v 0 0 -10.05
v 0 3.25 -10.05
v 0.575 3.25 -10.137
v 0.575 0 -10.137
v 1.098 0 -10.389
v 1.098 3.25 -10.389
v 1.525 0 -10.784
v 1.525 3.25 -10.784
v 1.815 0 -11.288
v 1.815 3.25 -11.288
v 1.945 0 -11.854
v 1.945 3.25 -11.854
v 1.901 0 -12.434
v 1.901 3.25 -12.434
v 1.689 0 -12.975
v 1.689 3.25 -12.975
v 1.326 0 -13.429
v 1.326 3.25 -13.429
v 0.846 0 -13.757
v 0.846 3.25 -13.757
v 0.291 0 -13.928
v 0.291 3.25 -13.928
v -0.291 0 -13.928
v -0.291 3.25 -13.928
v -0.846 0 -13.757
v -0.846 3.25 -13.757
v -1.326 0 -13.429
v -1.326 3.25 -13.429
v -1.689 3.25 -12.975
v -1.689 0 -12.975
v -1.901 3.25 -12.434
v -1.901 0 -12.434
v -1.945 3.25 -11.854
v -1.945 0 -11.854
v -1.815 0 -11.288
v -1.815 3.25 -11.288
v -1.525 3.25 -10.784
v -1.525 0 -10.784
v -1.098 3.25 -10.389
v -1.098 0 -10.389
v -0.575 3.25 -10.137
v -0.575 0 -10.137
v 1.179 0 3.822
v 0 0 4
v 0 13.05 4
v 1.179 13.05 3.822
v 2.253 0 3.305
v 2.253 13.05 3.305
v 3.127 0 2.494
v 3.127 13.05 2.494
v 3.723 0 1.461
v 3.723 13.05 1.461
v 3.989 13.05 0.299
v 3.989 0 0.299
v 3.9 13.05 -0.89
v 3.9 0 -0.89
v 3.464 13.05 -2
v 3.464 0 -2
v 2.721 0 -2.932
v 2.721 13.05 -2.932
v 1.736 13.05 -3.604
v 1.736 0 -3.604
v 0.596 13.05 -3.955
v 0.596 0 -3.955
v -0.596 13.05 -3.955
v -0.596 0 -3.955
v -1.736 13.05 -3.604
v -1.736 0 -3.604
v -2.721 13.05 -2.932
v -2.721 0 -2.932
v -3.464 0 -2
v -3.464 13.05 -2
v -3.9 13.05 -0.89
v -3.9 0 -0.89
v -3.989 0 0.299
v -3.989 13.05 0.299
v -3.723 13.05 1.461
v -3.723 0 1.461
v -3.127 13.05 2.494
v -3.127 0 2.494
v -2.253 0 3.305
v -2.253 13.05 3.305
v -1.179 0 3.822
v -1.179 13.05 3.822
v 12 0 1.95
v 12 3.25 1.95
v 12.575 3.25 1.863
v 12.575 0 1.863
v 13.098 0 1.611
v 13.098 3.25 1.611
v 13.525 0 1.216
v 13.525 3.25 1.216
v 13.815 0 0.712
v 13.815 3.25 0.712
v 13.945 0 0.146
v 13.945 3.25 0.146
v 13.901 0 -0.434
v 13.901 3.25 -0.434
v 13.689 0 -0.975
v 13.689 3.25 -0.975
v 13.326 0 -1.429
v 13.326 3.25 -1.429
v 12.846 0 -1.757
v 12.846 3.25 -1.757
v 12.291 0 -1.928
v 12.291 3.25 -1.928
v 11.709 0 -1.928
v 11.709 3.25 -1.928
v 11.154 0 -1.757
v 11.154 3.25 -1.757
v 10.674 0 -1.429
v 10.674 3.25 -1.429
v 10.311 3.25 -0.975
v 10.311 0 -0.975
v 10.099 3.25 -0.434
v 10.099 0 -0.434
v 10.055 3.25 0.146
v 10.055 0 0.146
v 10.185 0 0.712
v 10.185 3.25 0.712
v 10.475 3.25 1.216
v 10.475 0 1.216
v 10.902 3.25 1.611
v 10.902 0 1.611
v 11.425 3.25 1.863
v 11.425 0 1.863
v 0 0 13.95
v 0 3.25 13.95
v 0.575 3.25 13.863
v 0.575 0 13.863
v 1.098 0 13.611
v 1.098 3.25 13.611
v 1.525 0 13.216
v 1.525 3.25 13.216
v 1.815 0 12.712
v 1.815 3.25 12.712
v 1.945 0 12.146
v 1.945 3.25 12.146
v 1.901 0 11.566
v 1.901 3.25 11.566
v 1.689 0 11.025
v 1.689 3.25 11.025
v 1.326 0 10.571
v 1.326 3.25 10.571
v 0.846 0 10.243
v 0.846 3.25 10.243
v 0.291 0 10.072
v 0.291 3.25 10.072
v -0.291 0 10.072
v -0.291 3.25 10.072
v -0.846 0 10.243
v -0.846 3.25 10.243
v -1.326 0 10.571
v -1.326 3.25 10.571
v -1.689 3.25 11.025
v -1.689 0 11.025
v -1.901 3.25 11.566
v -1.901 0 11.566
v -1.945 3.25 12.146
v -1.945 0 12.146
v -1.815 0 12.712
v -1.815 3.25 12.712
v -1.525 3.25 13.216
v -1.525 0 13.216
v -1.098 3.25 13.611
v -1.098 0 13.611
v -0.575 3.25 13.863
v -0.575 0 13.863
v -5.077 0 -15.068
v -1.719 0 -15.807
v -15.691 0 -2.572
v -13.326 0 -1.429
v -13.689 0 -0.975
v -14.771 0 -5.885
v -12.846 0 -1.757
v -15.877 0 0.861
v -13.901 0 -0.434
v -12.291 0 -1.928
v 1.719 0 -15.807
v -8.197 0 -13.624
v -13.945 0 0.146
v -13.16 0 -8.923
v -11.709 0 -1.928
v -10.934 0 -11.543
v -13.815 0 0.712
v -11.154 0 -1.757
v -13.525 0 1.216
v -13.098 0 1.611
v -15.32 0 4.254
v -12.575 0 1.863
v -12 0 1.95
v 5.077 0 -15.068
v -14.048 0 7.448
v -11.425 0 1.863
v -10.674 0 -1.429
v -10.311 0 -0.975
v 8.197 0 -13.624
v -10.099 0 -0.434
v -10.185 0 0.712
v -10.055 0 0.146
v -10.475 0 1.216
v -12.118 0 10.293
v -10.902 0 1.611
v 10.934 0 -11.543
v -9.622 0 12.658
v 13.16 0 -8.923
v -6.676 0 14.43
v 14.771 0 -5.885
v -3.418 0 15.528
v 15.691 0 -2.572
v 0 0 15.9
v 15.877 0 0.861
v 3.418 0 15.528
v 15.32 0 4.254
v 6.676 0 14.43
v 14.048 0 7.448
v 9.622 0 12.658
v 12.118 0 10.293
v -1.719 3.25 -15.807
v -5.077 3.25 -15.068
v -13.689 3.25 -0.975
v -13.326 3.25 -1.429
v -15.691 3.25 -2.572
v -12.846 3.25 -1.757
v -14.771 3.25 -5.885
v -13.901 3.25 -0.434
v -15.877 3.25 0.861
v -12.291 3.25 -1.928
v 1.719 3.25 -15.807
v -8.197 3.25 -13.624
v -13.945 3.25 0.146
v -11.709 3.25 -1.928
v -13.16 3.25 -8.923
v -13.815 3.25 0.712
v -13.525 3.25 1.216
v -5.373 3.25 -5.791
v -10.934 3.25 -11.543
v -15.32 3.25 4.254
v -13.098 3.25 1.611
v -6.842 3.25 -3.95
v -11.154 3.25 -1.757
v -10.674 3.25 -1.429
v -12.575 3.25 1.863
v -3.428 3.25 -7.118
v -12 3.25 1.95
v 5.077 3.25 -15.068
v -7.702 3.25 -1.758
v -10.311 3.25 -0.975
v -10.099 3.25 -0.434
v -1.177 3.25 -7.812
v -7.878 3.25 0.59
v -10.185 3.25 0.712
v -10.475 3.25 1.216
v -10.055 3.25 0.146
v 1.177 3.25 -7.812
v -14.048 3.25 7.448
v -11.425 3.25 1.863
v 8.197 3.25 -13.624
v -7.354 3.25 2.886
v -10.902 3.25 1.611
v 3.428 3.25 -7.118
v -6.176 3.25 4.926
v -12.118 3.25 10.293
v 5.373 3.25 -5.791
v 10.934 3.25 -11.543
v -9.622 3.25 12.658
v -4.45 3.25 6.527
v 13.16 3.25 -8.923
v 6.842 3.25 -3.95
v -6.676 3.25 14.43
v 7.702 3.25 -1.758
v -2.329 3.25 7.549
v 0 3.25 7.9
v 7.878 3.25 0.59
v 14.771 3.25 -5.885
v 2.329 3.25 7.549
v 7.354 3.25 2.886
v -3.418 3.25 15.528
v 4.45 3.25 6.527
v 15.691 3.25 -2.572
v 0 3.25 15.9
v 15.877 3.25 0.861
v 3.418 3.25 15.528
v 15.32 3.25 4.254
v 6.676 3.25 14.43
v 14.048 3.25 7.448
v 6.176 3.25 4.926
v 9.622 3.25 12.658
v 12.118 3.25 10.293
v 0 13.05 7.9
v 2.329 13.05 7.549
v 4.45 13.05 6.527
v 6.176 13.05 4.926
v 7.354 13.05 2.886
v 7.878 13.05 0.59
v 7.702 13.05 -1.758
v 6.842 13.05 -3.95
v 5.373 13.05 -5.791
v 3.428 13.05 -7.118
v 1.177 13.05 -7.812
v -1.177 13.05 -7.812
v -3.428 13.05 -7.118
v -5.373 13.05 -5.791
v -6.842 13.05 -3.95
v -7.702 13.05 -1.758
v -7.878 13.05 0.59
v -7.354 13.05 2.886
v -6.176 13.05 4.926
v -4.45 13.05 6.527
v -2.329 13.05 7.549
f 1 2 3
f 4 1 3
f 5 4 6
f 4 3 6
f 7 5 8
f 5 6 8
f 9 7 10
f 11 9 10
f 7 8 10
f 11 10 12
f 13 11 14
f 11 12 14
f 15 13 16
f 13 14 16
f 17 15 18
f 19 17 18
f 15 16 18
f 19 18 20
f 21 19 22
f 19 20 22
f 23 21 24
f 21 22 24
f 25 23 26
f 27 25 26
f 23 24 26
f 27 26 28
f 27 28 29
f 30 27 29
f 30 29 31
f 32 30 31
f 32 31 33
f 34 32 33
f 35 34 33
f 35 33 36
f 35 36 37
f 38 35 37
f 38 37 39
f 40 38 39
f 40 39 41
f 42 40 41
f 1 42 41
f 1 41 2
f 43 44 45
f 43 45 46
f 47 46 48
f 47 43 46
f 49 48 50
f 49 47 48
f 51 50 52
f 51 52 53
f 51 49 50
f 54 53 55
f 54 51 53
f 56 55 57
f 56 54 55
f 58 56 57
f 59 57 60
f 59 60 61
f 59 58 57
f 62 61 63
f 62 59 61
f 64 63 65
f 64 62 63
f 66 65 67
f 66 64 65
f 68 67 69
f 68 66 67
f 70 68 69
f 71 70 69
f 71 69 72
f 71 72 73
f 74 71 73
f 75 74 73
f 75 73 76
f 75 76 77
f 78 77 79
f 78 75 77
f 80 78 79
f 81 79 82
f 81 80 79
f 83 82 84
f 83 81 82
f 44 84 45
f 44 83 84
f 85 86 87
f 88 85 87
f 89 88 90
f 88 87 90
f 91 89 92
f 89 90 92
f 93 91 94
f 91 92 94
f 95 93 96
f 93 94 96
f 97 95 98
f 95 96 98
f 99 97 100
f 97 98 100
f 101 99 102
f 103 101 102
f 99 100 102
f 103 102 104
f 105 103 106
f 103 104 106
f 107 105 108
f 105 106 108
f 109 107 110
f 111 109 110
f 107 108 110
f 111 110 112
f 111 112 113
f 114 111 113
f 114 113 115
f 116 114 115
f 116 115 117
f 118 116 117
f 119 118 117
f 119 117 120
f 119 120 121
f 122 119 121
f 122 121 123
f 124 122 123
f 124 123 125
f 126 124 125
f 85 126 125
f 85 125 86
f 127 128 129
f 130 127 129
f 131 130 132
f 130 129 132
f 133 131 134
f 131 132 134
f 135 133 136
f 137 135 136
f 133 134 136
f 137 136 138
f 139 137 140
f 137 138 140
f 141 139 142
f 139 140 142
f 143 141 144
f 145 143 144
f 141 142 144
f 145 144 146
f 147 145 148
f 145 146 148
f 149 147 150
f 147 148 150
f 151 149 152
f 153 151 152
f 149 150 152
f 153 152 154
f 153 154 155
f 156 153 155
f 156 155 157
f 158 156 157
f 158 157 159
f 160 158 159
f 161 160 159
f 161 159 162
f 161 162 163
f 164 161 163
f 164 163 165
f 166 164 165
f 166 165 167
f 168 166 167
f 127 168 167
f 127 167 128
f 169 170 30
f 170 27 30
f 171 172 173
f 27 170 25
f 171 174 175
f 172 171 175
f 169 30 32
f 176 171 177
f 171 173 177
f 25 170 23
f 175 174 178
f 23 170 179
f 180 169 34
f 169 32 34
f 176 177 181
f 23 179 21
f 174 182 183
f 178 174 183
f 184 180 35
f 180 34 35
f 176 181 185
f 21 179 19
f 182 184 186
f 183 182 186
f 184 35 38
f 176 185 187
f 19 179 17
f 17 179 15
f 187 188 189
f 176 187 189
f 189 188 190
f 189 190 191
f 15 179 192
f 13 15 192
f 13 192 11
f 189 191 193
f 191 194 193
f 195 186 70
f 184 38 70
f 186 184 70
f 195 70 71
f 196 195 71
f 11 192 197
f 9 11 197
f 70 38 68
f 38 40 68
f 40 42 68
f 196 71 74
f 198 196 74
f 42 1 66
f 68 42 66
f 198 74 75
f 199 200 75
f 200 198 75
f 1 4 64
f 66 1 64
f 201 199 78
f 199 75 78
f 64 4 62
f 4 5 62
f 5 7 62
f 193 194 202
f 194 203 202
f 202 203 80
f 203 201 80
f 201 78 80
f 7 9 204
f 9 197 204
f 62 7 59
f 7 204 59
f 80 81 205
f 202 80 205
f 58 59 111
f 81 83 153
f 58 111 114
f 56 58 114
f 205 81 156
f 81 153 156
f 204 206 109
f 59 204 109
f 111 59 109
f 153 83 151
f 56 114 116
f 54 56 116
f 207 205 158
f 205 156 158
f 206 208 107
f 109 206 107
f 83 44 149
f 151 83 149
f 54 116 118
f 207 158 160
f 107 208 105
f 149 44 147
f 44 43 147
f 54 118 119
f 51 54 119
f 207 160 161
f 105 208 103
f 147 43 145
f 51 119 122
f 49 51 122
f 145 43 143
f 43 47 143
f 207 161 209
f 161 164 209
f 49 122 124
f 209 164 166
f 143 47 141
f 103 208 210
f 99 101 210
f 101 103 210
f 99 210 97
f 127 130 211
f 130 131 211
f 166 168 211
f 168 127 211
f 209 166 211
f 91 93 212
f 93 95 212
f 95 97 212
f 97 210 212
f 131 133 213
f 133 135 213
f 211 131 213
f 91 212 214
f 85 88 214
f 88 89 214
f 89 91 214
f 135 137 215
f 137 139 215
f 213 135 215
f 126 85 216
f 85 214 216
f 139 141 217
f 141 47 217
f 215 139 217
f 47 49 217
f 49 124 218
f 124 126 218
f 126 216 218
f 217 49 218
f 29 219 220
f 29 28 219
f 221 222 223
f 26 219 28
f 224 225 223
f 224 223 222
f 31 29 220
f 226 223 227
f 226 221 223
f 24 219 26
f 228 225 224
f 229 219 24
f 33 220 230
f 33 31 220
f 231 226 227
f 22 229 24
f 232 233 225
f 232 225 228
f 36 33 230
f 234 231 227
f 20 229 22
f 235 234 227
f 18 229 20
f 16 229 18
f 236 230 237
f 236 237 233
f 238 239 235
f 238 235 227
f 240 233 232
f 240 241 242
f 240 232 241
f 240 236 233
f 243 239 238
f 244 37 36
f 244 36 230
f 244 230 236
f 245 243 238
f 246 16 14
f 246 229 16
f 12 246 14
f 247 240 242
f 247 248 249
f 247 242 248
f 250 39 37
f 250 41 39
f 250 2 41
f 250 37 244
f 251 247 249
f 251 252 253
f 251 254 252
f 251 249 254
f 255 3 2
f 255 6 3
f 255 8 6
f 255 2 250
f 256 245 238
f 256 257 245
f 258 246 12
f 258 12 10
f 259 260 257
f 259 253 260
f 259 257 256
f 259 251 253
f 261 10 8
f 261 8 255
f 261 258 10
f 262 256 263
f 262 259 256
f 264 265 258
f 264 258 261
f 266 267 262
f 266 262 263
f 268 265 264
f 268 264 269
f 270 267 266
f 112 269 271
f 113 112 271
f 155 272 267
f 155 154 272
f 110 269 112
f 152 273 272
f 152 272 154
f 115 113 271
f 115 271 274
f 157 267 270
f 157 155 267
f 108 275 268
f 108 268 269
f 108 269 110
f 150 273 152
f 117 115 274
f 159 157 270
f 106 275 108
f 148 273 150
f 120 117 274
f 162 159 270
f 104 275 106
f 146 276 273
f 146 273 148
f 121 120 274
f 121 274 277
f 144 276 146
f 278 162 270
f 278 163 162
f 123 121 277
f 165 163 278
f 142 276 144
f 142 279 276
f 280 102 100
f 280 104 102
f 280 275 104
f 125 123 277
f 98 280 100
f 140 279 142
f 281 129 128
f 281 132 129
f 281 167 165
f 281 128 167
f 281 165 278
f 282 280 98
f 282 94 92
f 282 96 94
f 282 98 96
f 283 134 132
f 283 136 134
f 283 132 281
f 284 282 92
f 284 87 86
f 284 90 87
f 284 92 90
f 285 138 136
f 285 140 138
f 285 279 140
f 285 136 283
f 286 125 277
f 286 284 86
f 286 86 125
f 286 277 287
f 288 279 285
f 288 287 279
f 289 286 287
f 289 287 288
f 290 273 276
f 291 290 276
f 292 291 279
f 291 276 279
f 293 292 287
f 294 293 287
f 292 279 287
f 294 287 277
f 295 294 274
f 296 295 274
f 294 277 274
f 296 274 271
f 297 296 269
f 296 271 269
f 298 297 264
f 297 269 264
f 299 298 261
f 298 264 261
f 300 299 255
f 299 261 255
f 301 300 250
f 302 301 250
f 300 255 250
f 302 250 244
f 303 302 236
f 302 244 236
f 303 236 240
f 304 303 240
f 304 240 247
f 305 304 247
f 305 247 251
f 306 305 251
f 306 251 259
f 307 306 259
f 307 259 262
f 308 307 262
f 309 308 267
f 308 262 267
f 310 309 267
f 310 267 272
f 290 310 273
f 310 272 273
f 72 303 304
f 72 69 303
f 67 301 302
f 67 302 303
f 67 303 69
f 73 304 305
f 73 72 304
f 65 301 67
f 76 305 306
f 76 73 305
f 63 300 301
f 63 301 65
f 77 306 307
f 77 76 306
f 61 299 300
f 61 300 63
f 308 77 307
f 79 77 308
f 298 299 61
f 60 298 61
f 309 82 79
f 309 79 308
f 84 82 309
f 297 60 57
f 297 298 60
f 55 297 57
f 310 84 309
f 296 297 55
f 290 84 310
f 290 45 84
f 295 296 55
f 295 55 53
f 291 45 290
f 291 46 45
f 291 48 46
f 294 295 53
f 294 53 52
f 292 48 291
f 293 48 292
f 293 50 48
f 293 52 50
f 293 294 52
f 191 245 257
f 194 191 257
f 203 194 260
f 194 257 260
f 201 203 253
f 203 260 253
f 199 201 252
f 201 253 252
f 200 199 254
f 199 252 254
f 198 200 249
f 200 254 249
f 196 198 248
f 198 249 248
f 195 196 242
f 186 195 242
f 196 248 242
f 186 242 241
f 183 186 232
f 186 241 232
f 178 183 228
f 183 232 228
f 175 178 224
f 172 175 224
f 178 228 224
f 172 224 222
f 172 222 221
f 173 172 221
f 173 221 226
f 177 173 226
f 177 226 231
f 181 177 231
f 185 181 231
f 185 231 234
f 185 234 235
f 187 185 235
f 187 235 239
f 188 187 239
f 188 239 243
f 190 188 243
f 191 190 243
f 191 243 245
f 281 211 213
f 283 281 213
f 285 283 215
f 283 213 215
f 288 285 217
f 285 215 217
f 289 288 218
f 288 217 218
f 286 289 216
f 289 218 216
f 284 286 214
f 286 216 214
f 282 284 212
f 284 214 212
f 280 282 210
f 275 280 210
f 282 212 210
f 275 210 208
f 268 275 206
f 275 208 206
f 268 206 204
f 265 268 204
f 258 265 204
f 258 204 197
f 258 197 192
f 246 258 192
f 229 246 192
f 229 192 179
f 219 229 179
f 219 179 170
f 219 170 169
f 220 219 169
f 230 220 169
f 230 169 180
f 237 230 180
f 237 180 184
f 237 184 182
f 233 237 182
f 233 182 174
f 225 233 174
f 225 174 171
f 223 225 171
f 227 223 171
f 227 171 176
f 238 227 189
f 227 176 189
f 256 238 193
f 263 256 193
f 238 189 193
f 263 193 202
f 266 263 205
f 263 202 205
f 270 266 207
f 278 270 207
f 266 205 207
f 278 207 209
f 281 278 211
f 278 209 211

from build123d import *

# Parameters (mm, degrees)
SKETCH1_R           = 15.9
SKETCH1_R_2         = 4
BOSS_EXTRUDE1_DEPTH = 13.05
CUT_EXTRUDE1_START  = -9.8
SKETCH2_R           = 15.9
SKETCH2_R_2         = 7.9
CUT_EXTRUDE1_DEPTH  = 9.8
SKETCH3_R           = 1.95
CUT_EXTRUDE2_DEPTH  = 9.8


with BuildPart() as part:
    # Sketch1 → Boss-Extrude1 (new body)
    with BuildSketch(Plane(origin=(0, 0, 0), x_dir=(1, 0, 0), z_dir=(0, 1, 0))):
        with Locations(Location((0, 0, 0), (0, 0, 270))):
            Circle(SKETCH1_R)
        with Locations(Location((0, 0, 0), (0, 0, 270))):
            Circle(SKETCH1_R_2, mode=Mode.SUBTRACT)
    extrude(amount=BOSS_EXTRUDE1_DEPTH)

    # Sketch2 → Cut-Extrude1 (cut)
    with BuildSketch(Plane(origin=(0, 13.05, 0), x_dir=(1, 0, 0), z_dir=(0, 1, 0)).offset(CUT_EXTRUDE1_START)):
        with Locations(Location((0, 0, 0), (0, 0, 270))):
            Circle(SKETCH2_R)
        with Locations(Location((0, 0, 0), (0, 0, 270))):
            Circle(SKETCH2_R_2, mode=Mode.SUBTRACT)
    extrude(amount=CUT_EXTRUDE1_DEPTH, mode=Mode.SUBTRACT)

    # Sketch3 → Cut-Extrude2 (cut)
    with BuildSketch(Plane(origin=(0, 3.25, 0), x_dir=(1, 0, 0), z_dir=(0, 1, 0))):
        with Locations(Location((0, 12, 0), (0, 0, 270))):
            Circle(SKETCH3_R)
        with Locations(Location((12, 0, 0), (0, 0, 270))):
            Circle(SKETCH3_R)
        with Locations(Location((0, -12, 0), (0, 0, 270))):
            Circle(SKETCH3_R)
        with Locations(Location((-12, 0, 0), (0, 0, 270))):
            Circle(SKETCH3_R)
    extrude(amount=-CUT_EXTRUDE2_DEPTH, mode=Mode.SUBTRACT)


solid = part.part
